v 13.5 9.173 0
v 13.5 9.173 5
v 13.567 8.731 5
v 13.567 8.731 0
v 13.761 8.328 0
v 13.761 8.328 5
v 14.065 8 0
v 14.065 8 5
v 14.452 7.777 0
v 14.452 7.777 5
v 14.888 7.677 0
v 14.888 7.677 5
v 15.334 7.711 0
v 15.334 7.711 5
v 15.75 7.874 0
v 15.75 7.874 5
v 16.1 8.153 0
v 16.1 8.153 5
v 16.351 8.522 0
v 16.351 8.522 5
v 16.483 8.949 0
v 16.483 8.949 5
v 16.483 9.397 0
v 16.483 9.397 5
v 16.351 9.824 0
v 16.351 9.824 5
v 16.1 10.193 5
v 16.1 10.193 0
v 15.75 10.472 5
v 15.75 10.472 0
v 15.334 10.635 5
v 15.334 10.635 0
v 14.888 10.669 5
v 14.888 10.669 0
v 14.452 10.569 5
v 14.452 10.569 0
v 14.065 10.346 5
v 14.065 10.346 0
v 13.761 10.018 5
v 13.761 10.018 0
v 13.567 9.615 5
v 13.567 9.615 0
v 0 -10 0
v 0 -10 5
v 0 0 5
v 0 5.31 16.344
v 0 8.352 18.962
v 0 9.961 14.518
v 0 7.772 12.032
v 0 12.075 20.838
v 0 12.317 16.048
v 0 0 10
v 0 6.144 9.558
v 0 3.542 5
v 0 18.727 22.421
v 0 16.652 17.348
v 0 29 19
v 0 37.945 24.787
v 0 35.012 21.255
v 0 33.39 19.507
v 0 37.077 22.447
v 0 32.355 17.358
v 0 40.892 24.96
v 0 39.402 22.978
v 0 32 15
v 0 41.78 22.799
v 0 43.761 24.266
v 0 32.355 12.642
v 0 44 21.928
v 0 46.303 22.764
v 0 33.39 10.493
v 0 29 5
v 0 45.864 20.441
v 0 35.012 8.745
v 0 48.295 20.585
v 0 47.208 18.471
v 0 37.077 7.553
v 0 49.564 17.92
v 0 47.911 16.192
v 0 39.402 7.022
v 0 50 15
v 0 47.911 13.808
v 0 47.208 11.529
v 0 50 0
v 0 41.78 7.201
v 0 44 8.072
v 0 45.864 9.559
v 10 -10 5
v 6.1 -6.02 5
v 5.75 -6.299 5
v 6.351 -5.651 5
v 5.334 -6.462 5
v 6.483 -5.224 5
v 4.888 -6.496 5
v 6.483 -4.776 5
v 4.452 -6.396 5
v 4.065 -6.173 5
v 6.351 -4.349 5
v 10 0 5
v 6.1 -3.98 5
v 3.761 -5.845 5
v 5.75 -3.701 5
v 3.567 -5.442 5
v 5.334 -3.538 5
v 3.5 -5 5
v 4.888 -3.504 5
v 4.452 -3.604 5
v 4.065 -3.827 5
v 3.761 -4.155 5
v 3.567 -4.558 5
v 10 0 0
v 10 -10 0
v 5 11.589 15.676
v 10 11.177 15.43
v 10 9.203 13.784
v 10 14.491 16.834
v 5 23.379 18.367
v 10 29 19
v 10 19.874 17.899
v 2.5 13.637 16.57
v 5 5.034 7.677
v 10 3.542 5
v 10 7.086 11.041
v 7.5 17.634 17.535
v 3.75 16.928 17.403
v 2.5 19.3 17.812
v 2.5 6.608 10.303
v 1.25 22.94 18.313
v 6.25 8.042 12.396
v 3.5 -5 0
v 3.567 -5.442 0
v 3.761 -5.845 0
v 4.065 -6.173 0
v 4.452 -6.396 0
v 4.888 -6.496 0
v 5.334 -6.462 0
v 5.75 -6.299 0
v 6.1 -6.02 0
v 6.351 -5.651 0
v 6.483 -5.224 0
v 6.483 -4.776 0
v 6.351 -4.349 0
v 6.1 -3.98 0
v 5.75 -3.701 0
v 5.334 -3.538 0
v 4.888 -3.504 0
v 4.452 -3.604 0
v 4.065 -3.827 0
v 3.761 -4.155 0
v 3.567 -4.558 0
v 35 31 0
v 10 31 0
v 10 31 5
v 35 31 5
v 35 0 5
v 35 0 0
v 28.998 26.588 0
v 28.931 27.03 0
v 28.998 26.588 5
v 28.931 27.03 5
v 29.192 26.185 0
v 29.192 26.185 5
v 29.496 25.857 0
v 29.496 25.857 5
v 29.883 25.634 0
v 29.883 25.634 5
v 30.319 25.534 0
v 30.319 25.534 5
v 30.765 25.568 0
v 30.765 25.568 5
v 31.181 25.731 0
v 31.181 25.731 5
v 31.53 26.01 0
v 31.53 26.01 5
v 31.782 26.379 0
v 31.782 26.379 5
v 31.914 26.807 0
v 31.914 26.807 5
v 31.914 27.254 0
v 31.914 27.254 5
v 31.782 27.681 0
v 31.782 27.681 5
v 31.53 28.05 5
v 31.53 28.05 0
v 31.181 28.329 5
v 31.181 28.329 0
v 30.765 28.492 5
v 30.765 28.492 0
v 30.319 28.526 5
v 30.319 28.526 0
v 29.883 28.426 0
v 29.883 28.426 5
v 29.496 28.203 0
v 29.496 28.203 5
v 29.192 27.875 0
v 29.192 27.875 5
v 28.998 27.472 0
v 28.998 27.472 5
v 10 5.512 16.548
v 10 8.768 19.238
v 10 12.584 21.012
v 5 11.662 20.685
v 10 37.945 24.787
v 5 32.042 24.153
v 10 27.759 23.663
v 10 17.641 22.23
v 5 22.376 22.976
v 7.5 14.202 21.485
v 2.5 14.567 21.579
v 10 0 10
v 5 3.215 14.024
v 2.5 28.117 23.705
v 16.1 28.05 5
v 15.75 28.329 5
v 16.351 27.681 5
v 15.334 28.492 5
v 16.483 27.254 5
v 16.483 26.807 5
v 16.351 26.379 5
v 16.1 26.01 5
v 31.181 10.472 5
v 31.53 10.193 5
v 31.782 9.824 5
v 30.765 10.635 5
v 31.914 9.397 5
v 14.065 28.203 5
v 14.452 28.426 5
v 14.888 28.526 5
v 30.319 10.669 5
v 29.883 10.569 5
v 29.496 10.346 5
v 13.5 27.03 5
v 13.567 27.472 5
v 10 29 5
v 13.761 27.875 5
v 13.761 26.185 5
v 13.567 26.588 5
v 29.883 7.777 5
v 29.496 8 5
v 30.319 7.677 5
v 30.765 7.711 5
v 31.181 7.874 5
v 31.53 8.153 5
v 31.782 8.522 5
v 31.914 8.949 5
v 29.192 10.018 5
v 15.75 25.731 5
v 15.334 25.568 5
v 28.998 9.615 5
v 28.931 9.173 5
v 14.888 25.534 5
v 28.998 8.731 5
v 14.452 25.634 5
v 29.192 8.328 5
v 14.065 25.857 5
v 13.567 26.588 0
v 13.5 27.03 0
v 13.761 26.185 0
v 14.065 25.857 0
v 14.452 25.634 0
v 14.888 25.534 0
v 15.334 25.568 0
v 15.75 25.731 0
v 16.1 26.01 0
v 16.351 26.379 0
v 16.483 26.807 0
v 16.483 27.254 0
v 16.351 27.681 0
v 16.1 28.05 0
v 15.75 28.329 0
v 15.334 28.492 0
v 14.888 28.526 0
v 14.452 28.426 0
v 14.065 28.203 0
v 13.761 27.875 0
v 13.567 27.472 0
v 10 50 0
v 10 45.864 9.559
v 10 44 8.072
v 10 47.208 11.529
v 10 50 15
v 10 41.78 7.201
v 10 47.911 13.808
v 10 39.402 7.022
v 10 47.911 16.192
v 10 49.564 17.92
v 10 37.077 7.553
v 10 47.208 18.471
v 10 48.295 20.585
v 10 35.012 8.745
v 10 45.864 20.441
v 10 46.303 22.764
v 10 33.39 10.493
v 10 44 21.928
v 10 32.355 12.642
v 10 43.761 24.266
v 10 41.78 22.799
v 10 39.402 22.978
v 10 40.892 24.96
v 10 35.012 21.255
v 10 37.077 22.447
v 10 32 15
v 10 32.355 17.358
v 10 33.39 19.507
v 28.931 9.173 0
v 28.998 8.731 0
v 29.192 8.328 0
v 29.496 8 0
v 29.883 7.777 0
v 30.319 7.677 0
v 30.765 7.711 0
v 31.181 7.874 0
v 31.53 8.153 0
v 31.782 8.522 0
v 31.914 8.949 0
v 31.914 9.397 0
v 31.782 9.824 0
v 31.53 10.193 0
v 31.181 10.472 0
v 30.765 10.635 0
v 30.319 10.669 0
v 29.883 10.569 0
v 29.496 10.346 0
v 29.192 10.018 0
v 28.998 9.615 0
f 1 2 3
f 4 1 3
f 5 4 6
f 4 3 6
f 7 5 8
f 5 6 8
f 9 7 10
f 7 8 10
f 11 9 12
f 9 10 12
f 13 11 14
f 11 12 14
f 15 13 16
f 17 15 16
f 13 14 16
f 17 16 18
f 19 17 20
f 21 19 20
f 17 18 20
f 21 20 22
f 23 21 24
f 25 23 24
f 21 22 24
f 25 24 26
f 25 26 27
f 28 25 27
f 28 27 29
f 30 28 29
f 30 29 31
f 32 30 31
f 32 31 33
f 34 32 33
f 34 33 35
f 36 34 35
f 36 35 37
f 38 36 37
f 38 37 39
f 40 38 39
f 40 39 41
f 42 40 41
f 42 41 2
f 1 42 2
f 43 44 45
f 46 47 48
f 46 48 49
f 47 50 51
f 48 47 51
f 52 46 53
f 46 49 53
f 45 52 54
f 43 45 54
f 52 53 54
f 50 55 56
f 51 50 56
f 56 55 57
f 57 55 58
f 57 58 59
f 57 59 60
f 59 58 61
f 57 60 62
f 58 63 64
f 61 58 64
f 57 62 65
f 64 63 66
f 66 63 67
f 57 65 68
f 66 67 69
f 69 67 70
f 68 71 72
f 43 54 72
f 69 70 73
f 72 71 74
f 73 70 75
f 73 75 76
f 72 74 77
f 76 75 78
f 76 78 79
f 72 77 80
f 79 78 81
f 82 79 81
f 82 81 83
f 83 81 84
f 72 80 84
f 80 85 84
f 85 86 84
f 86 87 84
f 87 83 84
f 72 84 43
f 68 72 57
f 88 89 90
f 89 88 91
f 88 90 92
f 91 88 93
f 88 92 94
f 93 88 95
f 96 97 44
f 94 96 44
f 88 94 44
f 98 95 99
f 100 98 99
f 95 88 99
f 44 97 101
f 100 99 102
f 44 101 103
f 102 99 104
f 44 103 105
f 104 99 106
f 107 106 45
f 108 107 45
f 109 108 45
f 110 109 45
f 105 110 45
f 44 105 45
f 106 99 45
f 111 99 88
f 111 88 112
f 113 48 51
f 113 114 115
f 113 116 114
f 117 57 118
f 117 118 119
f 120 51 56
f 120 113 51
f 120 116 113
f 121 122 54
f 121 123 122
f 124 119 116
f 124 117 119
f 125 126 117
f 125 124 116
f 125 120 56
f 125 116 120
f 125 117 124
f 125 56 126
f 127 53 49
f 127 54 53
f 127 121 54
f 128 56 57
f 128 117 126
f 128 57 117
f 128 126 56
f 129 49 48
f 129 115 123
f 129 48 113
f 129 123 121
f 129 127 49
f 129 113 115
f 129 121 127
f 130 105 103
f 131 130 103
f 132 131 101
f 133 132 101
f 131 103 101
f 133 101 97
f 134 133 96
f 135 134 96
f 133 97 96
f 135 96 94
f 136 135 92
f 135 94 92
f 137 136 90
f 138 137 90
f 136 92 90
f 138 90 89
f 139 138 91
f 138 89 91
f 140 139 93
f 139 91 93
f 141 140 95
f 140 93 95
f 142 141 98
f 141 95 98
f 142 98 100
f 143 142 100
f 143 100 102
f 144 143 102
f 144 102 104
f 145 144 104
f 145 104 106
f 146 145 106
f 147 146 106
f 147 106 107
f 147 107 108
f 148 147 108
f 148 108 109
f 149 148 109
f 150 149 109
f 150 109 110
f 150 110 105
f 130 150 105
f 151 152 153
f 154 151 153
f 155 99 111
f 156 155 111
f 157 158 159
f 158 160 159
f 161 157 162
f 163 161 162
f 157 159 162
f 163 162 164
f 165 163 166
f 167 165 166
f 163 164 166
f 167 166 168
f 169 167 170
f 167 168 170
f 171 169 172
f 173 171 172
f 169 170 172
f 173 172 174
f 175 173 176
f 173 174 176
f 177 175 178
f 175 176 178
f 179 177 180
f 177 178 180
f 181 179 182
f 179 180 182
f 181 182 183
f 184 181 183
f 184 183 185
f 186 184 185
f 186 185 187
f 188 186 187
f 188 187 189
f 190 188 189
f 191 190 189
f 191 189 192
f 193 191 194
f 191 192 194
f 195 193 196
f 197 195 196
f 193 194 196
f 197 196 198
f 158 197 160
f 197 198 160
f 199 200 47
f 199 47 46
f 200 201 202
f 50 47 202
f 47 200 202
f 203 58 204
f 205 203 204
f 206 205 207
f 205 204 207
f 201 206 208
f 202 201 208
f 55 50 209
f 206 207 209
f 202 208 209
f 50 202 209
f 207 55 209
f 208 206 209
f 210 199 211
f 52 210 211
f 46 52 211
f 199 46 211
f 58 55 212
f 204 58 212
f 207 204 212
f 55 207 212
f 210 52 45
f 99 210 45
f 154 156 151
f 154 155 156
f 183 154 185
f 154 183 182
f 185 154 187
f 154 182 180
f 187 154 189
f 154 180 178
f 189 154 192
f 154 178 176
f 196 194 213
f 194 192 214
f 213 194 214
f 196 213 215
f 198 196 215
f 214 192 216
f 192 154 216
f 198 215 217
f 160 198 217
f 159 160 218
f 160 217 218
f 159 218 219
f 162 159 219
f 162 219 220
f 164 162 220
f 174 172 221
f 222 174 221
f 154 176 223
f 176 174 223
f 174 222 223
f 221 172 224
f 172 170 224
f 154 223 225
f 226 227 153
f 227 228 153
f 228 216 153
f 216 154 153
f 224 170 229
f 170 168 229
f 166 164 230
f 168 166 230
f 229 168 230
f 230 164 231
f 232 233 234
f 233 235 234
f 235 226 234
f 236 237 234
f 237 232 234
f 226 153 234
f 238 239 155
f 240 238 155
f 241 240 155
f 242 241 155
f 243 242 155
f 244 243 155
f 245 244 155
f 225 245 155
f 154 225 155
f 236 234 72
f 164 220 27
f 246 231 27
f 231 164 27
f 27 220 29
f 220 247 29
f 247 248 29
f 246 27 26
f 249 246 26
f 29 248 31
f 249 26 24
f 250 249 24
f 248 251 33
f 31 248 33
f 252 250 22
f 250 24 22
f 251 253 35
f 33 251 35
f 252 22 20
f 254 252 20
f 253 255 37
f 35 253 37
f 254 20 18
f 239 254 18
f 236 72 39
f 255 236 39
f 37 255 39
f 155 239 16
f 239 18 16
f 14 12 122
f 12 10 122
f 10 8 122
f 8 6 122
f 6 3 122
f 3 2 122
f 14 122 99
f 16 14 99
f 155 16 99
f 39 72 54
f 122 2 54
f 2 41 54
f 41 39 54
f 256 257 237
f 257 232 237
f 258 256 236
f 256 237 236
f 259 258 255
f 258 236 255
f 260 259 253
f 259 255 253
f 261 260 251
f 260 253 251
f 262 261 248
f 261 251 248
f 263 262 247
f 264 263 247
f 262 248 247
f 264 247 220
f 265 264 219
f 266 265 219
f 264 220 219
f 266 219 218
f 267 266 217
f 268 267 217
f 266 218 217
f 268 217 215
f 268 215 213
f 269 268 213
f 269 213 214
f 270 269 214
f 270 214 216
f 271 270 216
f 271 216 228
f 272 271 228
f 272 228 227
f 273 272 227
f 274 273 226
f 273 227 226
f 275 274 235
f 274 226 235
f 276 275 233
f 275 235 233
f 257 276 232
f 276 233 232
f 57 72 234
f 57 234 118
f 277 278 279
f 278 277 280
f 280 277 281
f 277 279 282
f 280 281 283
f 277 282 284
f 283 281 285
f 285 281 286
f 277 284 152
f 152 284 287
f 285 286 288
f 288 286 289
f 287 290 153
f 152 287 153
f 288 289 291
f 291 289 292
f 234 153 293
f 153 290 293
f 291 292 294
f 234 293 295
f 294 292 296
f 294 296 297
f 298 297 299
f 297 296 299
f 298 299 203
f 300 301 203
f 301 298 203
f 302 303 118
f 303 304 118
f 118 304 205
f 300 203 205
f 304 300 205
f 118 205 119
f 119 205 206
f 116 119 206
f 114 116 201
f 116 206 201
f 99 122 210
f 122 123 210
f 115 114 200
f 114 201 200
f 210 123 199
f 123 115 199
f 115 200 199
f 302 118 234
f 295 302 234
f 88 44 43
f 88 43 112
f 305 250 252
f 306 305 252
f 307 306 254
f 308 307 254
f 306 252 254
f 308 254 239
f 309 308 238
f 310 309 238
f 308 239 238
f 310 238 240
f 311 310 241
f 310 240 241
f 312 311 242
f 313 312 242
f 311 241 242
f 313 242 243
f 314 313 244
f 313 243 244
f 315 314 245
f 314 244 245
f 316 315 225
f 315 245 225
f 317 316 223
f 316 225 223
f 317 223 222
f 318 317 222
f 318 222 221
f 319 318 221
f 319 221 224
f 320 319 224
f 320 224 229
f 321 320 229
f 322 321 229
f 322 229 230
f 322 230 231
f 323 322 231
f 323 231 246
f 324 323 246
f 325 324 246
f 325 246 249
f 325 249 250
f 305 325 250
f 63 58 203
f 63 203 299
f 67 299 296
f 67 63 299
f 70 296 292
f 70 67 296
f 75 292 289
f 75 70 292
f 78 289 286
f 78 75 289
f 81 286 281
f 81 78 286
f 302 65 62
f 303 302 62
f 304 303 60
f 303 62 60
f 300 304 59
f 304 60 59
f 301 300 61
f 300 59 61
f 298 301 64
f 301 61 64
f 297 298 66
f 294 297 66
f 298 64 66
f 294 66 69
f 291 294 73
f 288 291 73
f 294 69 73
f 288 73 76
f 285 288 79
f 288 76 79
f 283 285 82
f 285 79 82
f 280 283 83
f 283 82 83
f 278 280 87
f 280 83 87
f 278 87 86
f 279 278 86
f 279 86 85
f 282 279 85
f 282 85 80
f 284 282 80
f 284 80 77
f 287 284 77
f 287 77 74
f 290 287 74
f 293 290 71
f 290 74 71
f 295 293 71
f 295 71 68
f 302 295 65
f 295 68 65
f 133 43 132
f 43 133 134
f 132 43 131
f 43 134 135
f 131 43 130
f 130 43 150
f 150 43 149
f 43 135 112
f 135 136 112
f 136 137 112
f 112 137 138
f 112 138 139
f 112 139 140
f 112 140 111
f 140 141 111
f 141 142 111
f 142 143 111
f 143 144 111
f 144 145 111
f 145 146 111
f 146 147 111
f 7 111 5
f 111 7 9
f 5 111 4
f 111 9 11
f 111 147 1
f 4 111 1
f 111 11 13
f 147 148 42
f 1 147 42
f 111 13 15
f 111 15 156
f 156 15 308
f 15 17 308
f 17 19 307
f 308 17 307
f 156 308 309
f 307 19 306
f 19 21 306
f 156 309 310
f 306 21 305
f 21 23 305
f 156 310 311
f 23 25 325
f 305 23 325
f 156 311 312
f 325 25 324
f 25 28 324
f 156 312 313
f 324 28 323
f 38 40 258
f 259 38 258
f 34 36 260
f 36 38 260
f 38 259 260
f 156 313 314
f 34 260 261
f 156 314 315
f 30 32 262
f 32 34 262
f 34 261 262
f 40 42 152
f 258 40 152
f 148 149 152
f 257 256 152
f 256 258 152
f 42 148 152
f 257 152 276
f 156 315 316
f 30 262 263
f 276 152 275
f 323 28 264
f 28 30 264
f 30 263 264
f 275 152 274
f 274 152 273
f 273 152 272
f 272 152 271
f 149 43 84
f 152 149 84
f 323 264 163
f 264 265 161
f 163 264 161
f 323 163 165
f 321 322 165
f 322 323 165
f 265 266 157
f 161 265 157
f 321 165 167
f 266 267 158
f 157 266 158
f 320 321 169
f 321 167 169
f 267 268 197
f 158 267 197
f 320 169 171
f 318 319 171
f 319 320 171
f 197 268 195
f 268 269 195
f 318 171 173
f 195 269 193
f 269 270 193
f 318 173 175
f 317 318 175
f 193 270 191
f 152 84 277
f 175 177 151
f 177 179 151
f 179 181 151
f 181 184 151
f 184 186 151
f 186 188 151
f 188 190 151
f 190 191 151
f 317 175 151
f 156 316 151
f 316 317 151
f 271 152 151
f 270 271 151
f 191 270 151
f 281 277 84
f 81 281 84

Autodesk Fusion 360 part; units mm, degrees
sketch "Sketch1" plane through (0, 0, 0) normal (0, 0, 1) x (1, 0, 0)
  line L0 (0, 0) -> (20, 0)
  line L1 (20, 0) -> (20, 50)
  line L2 (20, 50) -> (0, 50)
  line L3 (0, 50) -> (0, 0)
  dimension "d1" = 50
extrude "Extrude1" add sketch "Sketch1" along normal blind 30
sketch "Sketch2" plane through (0, 0, 0) normal (0, -1, 0) x (1, 0, 0)
  line L0 (0, 0) -> (20, 0)
  line L1 (20, 0) -> (20, 30)
  line L2 (20, 30) -> (0, 30)
  line L3 (0, 30) -> (0, 0)
  line L4 (0, 30) -> (10, 30)
  line L5 (20, 0) -> (20, 5)
  line L6 (20, 5) -> (10, 5)
  line L7 (10, 5) -> (10, 30)
  dimension "d4" = 5
extrude "Extrude2" cut sketch "Sketch2" against normal blind 70 contours L1 L2 L6 L7
sketch "Sketch3" plane through (0, 0, 0) normal (-1, 0, 0) x (0, -1, 0)
  line L0 (-50, 0) -> (0, 0)
  line L1 (0, 0) -> (0, 30)
  line L2 (0, 30) -> (-50, 30)
  line L3 (-50, 30) -> (-50, 0)
  line L4 (-50, 15) -> (-40, 15)
  line L5 (-40, 15) -> (-40, 30)
  circle A0 centre (-40, 15) radius 8
  dimension "d7" = 16
extrude "Extrude3" cut sketch "Sketch3" against normal blind 15 contours L4 L5 A0 | L4 L5 A0
sketch "Sketch4" plane through (0, 0, 5) normal (0, 0, 1) x (-1, 0, 0)
  line L0 (-20, -50) -> (-10, -50)
  line L1 (-10, -50) -> (-10, 0)
  line L2 (-10, 0) -> (-20, 0)
  line L3 (-20, 0) -> (-20, -50)
  circle A0 centre (-15, -45) radius 0.25
  line L4 (-10, -30) -> (-20, -30)
  circle A1 centre (-15, -27.0301) radius 1.5
  circle A2 centre (-15, -23.4587) radius 1.5
  circle A3 centre (-15, -19.8873) radius 1.5
  circle A4 centre (-15, -16.3158) radius 1.5
  circle A5 centre (-15, -12.7444) radius 1.5
  circle A6 centre (-15, -9.173) radius 1.5
  circle A7 centre (-15, -5.6015) radius 1.5
  circle A8 centre (-15, -2.0301) radius 1.5
  dimension "d11" = 3
  dimension "d14" = 0
  dimension "d15" = 25
extrude "Extrude4" cut sketch "Sketch4" against normal blind 15 contours A1 | A2 | A3 | A4 | A5 | A6 | A7 | A8
sketch "Sketch5" plane through (0, 0, 0) normal (-1, 0, 0) x (0, -1, 0)
  circle A0 centre (-40, 15) radius 8
  line L0 (-50, 0) -> (0, 0)
  line L1 (0, 0) -> (0, 30)
  line L2 (0, 30) -> (-50, 30)
  line L3 (-50, 30) -> (-50, 0)
  circle A1 centre (-40, 15) radius 10
  spline S0 degree 2 poles (-40, 25) (-9.0379, 21.8056) (0, 10) knots 0 0 0 4.447549 4.447549 4.447549 weights 1 3 1
extrude "Extrude5" cut sketch "Sketch5" against normal blind 60 contours L1 L2 L3 A1 S0
sketch "Sketch6" plane through (0, 0, 0) normal (-1, 0, 0) x (0, -1, 0)
  arc A0 (-37.945, 24.7866) -> (-50, 15) centre (-40, 15) ccw
  line L0 (-50, 15) -> (-50, 0)
  line L1 (-50, 0) -> (0, 0)
  line L2 (0, 0) -> (0, 10)
  spline S0 degree 2 poles (0, 10) (-9.0024, 21.7593) (-37.945, 24.7866) knots -4.447549 -4.447549 -4.447549 -0.051947 -0.051947 -0.051947 weights 1 2.97664 1.046174
  circle A1 centre (-40, 15) radius 8
  line L3 (-3, 4) -> (-4, 4)
  line L4 (-4, 4) -> (-29, 4)
  line L5 (-29, 4) -> (-29, 19)
  spline S1 degree 2 poles (-29, 19) (-10, 17) (-3, 4) knots 0 0 0 3.222354 3.222354 3.222354 weights 1 3 1
  line L6 (-3.5416, 5) -> (-29, 5)
extrude "Extrude6" cut sketch "Sketch6" against normal blind 16 contours L5 S1 L6
sketch "Sketch7" plane through (0, 0, 5) normal (0, 0, 1) x (-1, 0, 0)
  circle A0 centre (-15, -9.173) radius 1.5
  circle A1 centre (-15, -5.6015) radius 1.5
  circle A2 centre (-15, -12.7444) radius 1.5
  circle A3 centre (-15, -16.3158) radius 1.5
  line L0 (-10, -3.5416) -> (-10, 0)
  line L1 (-10, 0) -> (-20, 0)
  line L2 (-20, 0) -> (-20, -50)
  line L3 (-20, -50) -> (-10, -50)
  line L4 (-10, -50) -> (-10, -29)
  line L5 (-10, -29) -> (0, -29)
  line L6 (0, -29) -> (0, -3.5416)
  line L7 (0, -3.5416) -> (-10, -3.5416)
  circle A4 centre (-15, -19.8873) radius 1.5
  circle A5 centre (-15, -27.0301) radius 1.5
  circle A6 centre (-15, -23.4587) radius 1.5
  circle A7 centre (-15, -2.0301) radius 1.5
  line L8 (-10, -50) -> (-10, -31)
  line L9 (-20, -31) -> (-10, -31)
  line L10 (-20, -31) -> (-20, -50)
  line L11 (-10, -50) -> (-20, -50)
extrude "Extrude7" cut sketch "Sketch7" against normal blind 15 contours L2 L3 L4 L8 L9 L10 L11
sketch "Sketch8" plane through (0, 0, 0) normal (0, 0, -1) x (1, 0, 0)
  line L0 (10, -31) -> (20, -31)
  line L1 (20, -31) -> (20, 0)
  line L2 (20, 0) -> (0, 0)
  line L3 (0, 0) -> (0, -50)
  line L4 (0, -50) -> (10, -50)
  line L5 (10, -50) -> (10, -31)
  circle A0 centre (15, -19.8873) radius 1.5
  circle A1 centre (15, -5.6015) radius 1.5
  circle A2 centre (15, -9.173) radius 1.5
  circle A3 centre (15, -23.4587) radius 1.5
  circle A4 centre (15, -16.3158) radius 1.5
  circle A5 centre (15, -2.0301) radius 1.5
  circle A6 centre (15, -12.7444) radius 1.5
  circle A7 centre (15, -27.0301) radius 1.5
  circle A8 centre (15, -5.6015) radius 1.5
  circle A9 centre (15, -2.0301) radius 1.5
  circle A10 centre (15, -12.7444) radius 1.5
  circle A11 centre (15, -16.3158) radius 1.5
  circle A12 centre (15, -19.8873) radius 1.5
  circle A13 centre (15, -23.4587) radius 1.5
extrude "Extrude8" add sketch "Sketch8" against normal blind 5 contours A0 A12 | A1 A8 | A3 A13 | A4 A11 | A5 A9 | A6 A10
sketch "Sketch9" plane through (20, 0, 0) normal (1, 0, 0) x (0, 1, 0)
  line L0 (31, 0) -> (31, 5)
  line L1 (31, 5) -> (0, 5)
  line L2 (0, 5) -> (0, 0)
  line L3 (0, 0) -> (31, 0)
extrude "Extrude9" add sketch "Sketch9" along normal blind 15
sketch "Sketch10" plane through (0, 0, 5) normal (0, 0, 1) x (-1, 0, 0)
  line L0 (-35, -31) -> (-10, -31)
  line L1 (-10, -31) -> (-10, -29)
  line L2 (-10, -29) -> (0, -29)
  line L3 (0, -29) -> (0, -3.5416)
  line L4 (0, -3.5416) -> (-10, -3.5416)
  line L5 (-10, -3.5416) -> (-10, 0)
  line L6 (-10, 0) -> (-35, 0)
  line L7 (-35, 0) -> (-35, -31)
  circle A0 centre (-15, -9.173) radius 1.5
  circle A1 centre (-15, -27.0301) radius 1.5
  circle A2 centre (-30.4309, -27.0301) radius 1.5
  circle A3 centre (-30.4309, -9.173) radius 1.5
  dimension "d30" = 3
  dimension "d31" = 3
extrude "Extrude10" cut sketch "Sketch10" against normal blind 40 contours A2 | A3
sketch "Sketch11" plane through (0, 0, 0) normal (0, -1, 0) x (1, 0, 0)
  line L0 (10, 10) -> (0, 10)
  line L1 (0, 10) -> (0, 0)
  line L2 (0, 0) -> (35, 0)
  line L3 (35, 0) -> (35, 5)
  line L4 (35, 5) -> (10, 5)
  line L5 (10, 5) -> (10, 10)
  line L6 (10, 5) -> (0, 5)
  line L7 (0, 0) -> (0, 5)
  line L8 (10, 5) -> (10, 0)
  line L9 (0, 0) -> (10, 0)
extrude "Extrude11" add sketch "Sketch11" along normal blind 10 contours L1 L2 L6 L7 L8 L9
sketch "Sketch12" plane through (0, 0, 5) normal (0, 0, 1) x (-1, 0, 0)
  line L0 (-10, 0) -> (0, 0)
  line L1 (0, 0) -> (0, 10)
  line L2 (0, 10) -> (-10, 10)
  line L3 (-10, 10) -> (-10, 0)
  circle A0 centre (-5, 5) radius 1.5
  dimension "d36" = 3
extrude "Extrude12" cut sketch "Sketch12" against normal blind 15 contours A0
